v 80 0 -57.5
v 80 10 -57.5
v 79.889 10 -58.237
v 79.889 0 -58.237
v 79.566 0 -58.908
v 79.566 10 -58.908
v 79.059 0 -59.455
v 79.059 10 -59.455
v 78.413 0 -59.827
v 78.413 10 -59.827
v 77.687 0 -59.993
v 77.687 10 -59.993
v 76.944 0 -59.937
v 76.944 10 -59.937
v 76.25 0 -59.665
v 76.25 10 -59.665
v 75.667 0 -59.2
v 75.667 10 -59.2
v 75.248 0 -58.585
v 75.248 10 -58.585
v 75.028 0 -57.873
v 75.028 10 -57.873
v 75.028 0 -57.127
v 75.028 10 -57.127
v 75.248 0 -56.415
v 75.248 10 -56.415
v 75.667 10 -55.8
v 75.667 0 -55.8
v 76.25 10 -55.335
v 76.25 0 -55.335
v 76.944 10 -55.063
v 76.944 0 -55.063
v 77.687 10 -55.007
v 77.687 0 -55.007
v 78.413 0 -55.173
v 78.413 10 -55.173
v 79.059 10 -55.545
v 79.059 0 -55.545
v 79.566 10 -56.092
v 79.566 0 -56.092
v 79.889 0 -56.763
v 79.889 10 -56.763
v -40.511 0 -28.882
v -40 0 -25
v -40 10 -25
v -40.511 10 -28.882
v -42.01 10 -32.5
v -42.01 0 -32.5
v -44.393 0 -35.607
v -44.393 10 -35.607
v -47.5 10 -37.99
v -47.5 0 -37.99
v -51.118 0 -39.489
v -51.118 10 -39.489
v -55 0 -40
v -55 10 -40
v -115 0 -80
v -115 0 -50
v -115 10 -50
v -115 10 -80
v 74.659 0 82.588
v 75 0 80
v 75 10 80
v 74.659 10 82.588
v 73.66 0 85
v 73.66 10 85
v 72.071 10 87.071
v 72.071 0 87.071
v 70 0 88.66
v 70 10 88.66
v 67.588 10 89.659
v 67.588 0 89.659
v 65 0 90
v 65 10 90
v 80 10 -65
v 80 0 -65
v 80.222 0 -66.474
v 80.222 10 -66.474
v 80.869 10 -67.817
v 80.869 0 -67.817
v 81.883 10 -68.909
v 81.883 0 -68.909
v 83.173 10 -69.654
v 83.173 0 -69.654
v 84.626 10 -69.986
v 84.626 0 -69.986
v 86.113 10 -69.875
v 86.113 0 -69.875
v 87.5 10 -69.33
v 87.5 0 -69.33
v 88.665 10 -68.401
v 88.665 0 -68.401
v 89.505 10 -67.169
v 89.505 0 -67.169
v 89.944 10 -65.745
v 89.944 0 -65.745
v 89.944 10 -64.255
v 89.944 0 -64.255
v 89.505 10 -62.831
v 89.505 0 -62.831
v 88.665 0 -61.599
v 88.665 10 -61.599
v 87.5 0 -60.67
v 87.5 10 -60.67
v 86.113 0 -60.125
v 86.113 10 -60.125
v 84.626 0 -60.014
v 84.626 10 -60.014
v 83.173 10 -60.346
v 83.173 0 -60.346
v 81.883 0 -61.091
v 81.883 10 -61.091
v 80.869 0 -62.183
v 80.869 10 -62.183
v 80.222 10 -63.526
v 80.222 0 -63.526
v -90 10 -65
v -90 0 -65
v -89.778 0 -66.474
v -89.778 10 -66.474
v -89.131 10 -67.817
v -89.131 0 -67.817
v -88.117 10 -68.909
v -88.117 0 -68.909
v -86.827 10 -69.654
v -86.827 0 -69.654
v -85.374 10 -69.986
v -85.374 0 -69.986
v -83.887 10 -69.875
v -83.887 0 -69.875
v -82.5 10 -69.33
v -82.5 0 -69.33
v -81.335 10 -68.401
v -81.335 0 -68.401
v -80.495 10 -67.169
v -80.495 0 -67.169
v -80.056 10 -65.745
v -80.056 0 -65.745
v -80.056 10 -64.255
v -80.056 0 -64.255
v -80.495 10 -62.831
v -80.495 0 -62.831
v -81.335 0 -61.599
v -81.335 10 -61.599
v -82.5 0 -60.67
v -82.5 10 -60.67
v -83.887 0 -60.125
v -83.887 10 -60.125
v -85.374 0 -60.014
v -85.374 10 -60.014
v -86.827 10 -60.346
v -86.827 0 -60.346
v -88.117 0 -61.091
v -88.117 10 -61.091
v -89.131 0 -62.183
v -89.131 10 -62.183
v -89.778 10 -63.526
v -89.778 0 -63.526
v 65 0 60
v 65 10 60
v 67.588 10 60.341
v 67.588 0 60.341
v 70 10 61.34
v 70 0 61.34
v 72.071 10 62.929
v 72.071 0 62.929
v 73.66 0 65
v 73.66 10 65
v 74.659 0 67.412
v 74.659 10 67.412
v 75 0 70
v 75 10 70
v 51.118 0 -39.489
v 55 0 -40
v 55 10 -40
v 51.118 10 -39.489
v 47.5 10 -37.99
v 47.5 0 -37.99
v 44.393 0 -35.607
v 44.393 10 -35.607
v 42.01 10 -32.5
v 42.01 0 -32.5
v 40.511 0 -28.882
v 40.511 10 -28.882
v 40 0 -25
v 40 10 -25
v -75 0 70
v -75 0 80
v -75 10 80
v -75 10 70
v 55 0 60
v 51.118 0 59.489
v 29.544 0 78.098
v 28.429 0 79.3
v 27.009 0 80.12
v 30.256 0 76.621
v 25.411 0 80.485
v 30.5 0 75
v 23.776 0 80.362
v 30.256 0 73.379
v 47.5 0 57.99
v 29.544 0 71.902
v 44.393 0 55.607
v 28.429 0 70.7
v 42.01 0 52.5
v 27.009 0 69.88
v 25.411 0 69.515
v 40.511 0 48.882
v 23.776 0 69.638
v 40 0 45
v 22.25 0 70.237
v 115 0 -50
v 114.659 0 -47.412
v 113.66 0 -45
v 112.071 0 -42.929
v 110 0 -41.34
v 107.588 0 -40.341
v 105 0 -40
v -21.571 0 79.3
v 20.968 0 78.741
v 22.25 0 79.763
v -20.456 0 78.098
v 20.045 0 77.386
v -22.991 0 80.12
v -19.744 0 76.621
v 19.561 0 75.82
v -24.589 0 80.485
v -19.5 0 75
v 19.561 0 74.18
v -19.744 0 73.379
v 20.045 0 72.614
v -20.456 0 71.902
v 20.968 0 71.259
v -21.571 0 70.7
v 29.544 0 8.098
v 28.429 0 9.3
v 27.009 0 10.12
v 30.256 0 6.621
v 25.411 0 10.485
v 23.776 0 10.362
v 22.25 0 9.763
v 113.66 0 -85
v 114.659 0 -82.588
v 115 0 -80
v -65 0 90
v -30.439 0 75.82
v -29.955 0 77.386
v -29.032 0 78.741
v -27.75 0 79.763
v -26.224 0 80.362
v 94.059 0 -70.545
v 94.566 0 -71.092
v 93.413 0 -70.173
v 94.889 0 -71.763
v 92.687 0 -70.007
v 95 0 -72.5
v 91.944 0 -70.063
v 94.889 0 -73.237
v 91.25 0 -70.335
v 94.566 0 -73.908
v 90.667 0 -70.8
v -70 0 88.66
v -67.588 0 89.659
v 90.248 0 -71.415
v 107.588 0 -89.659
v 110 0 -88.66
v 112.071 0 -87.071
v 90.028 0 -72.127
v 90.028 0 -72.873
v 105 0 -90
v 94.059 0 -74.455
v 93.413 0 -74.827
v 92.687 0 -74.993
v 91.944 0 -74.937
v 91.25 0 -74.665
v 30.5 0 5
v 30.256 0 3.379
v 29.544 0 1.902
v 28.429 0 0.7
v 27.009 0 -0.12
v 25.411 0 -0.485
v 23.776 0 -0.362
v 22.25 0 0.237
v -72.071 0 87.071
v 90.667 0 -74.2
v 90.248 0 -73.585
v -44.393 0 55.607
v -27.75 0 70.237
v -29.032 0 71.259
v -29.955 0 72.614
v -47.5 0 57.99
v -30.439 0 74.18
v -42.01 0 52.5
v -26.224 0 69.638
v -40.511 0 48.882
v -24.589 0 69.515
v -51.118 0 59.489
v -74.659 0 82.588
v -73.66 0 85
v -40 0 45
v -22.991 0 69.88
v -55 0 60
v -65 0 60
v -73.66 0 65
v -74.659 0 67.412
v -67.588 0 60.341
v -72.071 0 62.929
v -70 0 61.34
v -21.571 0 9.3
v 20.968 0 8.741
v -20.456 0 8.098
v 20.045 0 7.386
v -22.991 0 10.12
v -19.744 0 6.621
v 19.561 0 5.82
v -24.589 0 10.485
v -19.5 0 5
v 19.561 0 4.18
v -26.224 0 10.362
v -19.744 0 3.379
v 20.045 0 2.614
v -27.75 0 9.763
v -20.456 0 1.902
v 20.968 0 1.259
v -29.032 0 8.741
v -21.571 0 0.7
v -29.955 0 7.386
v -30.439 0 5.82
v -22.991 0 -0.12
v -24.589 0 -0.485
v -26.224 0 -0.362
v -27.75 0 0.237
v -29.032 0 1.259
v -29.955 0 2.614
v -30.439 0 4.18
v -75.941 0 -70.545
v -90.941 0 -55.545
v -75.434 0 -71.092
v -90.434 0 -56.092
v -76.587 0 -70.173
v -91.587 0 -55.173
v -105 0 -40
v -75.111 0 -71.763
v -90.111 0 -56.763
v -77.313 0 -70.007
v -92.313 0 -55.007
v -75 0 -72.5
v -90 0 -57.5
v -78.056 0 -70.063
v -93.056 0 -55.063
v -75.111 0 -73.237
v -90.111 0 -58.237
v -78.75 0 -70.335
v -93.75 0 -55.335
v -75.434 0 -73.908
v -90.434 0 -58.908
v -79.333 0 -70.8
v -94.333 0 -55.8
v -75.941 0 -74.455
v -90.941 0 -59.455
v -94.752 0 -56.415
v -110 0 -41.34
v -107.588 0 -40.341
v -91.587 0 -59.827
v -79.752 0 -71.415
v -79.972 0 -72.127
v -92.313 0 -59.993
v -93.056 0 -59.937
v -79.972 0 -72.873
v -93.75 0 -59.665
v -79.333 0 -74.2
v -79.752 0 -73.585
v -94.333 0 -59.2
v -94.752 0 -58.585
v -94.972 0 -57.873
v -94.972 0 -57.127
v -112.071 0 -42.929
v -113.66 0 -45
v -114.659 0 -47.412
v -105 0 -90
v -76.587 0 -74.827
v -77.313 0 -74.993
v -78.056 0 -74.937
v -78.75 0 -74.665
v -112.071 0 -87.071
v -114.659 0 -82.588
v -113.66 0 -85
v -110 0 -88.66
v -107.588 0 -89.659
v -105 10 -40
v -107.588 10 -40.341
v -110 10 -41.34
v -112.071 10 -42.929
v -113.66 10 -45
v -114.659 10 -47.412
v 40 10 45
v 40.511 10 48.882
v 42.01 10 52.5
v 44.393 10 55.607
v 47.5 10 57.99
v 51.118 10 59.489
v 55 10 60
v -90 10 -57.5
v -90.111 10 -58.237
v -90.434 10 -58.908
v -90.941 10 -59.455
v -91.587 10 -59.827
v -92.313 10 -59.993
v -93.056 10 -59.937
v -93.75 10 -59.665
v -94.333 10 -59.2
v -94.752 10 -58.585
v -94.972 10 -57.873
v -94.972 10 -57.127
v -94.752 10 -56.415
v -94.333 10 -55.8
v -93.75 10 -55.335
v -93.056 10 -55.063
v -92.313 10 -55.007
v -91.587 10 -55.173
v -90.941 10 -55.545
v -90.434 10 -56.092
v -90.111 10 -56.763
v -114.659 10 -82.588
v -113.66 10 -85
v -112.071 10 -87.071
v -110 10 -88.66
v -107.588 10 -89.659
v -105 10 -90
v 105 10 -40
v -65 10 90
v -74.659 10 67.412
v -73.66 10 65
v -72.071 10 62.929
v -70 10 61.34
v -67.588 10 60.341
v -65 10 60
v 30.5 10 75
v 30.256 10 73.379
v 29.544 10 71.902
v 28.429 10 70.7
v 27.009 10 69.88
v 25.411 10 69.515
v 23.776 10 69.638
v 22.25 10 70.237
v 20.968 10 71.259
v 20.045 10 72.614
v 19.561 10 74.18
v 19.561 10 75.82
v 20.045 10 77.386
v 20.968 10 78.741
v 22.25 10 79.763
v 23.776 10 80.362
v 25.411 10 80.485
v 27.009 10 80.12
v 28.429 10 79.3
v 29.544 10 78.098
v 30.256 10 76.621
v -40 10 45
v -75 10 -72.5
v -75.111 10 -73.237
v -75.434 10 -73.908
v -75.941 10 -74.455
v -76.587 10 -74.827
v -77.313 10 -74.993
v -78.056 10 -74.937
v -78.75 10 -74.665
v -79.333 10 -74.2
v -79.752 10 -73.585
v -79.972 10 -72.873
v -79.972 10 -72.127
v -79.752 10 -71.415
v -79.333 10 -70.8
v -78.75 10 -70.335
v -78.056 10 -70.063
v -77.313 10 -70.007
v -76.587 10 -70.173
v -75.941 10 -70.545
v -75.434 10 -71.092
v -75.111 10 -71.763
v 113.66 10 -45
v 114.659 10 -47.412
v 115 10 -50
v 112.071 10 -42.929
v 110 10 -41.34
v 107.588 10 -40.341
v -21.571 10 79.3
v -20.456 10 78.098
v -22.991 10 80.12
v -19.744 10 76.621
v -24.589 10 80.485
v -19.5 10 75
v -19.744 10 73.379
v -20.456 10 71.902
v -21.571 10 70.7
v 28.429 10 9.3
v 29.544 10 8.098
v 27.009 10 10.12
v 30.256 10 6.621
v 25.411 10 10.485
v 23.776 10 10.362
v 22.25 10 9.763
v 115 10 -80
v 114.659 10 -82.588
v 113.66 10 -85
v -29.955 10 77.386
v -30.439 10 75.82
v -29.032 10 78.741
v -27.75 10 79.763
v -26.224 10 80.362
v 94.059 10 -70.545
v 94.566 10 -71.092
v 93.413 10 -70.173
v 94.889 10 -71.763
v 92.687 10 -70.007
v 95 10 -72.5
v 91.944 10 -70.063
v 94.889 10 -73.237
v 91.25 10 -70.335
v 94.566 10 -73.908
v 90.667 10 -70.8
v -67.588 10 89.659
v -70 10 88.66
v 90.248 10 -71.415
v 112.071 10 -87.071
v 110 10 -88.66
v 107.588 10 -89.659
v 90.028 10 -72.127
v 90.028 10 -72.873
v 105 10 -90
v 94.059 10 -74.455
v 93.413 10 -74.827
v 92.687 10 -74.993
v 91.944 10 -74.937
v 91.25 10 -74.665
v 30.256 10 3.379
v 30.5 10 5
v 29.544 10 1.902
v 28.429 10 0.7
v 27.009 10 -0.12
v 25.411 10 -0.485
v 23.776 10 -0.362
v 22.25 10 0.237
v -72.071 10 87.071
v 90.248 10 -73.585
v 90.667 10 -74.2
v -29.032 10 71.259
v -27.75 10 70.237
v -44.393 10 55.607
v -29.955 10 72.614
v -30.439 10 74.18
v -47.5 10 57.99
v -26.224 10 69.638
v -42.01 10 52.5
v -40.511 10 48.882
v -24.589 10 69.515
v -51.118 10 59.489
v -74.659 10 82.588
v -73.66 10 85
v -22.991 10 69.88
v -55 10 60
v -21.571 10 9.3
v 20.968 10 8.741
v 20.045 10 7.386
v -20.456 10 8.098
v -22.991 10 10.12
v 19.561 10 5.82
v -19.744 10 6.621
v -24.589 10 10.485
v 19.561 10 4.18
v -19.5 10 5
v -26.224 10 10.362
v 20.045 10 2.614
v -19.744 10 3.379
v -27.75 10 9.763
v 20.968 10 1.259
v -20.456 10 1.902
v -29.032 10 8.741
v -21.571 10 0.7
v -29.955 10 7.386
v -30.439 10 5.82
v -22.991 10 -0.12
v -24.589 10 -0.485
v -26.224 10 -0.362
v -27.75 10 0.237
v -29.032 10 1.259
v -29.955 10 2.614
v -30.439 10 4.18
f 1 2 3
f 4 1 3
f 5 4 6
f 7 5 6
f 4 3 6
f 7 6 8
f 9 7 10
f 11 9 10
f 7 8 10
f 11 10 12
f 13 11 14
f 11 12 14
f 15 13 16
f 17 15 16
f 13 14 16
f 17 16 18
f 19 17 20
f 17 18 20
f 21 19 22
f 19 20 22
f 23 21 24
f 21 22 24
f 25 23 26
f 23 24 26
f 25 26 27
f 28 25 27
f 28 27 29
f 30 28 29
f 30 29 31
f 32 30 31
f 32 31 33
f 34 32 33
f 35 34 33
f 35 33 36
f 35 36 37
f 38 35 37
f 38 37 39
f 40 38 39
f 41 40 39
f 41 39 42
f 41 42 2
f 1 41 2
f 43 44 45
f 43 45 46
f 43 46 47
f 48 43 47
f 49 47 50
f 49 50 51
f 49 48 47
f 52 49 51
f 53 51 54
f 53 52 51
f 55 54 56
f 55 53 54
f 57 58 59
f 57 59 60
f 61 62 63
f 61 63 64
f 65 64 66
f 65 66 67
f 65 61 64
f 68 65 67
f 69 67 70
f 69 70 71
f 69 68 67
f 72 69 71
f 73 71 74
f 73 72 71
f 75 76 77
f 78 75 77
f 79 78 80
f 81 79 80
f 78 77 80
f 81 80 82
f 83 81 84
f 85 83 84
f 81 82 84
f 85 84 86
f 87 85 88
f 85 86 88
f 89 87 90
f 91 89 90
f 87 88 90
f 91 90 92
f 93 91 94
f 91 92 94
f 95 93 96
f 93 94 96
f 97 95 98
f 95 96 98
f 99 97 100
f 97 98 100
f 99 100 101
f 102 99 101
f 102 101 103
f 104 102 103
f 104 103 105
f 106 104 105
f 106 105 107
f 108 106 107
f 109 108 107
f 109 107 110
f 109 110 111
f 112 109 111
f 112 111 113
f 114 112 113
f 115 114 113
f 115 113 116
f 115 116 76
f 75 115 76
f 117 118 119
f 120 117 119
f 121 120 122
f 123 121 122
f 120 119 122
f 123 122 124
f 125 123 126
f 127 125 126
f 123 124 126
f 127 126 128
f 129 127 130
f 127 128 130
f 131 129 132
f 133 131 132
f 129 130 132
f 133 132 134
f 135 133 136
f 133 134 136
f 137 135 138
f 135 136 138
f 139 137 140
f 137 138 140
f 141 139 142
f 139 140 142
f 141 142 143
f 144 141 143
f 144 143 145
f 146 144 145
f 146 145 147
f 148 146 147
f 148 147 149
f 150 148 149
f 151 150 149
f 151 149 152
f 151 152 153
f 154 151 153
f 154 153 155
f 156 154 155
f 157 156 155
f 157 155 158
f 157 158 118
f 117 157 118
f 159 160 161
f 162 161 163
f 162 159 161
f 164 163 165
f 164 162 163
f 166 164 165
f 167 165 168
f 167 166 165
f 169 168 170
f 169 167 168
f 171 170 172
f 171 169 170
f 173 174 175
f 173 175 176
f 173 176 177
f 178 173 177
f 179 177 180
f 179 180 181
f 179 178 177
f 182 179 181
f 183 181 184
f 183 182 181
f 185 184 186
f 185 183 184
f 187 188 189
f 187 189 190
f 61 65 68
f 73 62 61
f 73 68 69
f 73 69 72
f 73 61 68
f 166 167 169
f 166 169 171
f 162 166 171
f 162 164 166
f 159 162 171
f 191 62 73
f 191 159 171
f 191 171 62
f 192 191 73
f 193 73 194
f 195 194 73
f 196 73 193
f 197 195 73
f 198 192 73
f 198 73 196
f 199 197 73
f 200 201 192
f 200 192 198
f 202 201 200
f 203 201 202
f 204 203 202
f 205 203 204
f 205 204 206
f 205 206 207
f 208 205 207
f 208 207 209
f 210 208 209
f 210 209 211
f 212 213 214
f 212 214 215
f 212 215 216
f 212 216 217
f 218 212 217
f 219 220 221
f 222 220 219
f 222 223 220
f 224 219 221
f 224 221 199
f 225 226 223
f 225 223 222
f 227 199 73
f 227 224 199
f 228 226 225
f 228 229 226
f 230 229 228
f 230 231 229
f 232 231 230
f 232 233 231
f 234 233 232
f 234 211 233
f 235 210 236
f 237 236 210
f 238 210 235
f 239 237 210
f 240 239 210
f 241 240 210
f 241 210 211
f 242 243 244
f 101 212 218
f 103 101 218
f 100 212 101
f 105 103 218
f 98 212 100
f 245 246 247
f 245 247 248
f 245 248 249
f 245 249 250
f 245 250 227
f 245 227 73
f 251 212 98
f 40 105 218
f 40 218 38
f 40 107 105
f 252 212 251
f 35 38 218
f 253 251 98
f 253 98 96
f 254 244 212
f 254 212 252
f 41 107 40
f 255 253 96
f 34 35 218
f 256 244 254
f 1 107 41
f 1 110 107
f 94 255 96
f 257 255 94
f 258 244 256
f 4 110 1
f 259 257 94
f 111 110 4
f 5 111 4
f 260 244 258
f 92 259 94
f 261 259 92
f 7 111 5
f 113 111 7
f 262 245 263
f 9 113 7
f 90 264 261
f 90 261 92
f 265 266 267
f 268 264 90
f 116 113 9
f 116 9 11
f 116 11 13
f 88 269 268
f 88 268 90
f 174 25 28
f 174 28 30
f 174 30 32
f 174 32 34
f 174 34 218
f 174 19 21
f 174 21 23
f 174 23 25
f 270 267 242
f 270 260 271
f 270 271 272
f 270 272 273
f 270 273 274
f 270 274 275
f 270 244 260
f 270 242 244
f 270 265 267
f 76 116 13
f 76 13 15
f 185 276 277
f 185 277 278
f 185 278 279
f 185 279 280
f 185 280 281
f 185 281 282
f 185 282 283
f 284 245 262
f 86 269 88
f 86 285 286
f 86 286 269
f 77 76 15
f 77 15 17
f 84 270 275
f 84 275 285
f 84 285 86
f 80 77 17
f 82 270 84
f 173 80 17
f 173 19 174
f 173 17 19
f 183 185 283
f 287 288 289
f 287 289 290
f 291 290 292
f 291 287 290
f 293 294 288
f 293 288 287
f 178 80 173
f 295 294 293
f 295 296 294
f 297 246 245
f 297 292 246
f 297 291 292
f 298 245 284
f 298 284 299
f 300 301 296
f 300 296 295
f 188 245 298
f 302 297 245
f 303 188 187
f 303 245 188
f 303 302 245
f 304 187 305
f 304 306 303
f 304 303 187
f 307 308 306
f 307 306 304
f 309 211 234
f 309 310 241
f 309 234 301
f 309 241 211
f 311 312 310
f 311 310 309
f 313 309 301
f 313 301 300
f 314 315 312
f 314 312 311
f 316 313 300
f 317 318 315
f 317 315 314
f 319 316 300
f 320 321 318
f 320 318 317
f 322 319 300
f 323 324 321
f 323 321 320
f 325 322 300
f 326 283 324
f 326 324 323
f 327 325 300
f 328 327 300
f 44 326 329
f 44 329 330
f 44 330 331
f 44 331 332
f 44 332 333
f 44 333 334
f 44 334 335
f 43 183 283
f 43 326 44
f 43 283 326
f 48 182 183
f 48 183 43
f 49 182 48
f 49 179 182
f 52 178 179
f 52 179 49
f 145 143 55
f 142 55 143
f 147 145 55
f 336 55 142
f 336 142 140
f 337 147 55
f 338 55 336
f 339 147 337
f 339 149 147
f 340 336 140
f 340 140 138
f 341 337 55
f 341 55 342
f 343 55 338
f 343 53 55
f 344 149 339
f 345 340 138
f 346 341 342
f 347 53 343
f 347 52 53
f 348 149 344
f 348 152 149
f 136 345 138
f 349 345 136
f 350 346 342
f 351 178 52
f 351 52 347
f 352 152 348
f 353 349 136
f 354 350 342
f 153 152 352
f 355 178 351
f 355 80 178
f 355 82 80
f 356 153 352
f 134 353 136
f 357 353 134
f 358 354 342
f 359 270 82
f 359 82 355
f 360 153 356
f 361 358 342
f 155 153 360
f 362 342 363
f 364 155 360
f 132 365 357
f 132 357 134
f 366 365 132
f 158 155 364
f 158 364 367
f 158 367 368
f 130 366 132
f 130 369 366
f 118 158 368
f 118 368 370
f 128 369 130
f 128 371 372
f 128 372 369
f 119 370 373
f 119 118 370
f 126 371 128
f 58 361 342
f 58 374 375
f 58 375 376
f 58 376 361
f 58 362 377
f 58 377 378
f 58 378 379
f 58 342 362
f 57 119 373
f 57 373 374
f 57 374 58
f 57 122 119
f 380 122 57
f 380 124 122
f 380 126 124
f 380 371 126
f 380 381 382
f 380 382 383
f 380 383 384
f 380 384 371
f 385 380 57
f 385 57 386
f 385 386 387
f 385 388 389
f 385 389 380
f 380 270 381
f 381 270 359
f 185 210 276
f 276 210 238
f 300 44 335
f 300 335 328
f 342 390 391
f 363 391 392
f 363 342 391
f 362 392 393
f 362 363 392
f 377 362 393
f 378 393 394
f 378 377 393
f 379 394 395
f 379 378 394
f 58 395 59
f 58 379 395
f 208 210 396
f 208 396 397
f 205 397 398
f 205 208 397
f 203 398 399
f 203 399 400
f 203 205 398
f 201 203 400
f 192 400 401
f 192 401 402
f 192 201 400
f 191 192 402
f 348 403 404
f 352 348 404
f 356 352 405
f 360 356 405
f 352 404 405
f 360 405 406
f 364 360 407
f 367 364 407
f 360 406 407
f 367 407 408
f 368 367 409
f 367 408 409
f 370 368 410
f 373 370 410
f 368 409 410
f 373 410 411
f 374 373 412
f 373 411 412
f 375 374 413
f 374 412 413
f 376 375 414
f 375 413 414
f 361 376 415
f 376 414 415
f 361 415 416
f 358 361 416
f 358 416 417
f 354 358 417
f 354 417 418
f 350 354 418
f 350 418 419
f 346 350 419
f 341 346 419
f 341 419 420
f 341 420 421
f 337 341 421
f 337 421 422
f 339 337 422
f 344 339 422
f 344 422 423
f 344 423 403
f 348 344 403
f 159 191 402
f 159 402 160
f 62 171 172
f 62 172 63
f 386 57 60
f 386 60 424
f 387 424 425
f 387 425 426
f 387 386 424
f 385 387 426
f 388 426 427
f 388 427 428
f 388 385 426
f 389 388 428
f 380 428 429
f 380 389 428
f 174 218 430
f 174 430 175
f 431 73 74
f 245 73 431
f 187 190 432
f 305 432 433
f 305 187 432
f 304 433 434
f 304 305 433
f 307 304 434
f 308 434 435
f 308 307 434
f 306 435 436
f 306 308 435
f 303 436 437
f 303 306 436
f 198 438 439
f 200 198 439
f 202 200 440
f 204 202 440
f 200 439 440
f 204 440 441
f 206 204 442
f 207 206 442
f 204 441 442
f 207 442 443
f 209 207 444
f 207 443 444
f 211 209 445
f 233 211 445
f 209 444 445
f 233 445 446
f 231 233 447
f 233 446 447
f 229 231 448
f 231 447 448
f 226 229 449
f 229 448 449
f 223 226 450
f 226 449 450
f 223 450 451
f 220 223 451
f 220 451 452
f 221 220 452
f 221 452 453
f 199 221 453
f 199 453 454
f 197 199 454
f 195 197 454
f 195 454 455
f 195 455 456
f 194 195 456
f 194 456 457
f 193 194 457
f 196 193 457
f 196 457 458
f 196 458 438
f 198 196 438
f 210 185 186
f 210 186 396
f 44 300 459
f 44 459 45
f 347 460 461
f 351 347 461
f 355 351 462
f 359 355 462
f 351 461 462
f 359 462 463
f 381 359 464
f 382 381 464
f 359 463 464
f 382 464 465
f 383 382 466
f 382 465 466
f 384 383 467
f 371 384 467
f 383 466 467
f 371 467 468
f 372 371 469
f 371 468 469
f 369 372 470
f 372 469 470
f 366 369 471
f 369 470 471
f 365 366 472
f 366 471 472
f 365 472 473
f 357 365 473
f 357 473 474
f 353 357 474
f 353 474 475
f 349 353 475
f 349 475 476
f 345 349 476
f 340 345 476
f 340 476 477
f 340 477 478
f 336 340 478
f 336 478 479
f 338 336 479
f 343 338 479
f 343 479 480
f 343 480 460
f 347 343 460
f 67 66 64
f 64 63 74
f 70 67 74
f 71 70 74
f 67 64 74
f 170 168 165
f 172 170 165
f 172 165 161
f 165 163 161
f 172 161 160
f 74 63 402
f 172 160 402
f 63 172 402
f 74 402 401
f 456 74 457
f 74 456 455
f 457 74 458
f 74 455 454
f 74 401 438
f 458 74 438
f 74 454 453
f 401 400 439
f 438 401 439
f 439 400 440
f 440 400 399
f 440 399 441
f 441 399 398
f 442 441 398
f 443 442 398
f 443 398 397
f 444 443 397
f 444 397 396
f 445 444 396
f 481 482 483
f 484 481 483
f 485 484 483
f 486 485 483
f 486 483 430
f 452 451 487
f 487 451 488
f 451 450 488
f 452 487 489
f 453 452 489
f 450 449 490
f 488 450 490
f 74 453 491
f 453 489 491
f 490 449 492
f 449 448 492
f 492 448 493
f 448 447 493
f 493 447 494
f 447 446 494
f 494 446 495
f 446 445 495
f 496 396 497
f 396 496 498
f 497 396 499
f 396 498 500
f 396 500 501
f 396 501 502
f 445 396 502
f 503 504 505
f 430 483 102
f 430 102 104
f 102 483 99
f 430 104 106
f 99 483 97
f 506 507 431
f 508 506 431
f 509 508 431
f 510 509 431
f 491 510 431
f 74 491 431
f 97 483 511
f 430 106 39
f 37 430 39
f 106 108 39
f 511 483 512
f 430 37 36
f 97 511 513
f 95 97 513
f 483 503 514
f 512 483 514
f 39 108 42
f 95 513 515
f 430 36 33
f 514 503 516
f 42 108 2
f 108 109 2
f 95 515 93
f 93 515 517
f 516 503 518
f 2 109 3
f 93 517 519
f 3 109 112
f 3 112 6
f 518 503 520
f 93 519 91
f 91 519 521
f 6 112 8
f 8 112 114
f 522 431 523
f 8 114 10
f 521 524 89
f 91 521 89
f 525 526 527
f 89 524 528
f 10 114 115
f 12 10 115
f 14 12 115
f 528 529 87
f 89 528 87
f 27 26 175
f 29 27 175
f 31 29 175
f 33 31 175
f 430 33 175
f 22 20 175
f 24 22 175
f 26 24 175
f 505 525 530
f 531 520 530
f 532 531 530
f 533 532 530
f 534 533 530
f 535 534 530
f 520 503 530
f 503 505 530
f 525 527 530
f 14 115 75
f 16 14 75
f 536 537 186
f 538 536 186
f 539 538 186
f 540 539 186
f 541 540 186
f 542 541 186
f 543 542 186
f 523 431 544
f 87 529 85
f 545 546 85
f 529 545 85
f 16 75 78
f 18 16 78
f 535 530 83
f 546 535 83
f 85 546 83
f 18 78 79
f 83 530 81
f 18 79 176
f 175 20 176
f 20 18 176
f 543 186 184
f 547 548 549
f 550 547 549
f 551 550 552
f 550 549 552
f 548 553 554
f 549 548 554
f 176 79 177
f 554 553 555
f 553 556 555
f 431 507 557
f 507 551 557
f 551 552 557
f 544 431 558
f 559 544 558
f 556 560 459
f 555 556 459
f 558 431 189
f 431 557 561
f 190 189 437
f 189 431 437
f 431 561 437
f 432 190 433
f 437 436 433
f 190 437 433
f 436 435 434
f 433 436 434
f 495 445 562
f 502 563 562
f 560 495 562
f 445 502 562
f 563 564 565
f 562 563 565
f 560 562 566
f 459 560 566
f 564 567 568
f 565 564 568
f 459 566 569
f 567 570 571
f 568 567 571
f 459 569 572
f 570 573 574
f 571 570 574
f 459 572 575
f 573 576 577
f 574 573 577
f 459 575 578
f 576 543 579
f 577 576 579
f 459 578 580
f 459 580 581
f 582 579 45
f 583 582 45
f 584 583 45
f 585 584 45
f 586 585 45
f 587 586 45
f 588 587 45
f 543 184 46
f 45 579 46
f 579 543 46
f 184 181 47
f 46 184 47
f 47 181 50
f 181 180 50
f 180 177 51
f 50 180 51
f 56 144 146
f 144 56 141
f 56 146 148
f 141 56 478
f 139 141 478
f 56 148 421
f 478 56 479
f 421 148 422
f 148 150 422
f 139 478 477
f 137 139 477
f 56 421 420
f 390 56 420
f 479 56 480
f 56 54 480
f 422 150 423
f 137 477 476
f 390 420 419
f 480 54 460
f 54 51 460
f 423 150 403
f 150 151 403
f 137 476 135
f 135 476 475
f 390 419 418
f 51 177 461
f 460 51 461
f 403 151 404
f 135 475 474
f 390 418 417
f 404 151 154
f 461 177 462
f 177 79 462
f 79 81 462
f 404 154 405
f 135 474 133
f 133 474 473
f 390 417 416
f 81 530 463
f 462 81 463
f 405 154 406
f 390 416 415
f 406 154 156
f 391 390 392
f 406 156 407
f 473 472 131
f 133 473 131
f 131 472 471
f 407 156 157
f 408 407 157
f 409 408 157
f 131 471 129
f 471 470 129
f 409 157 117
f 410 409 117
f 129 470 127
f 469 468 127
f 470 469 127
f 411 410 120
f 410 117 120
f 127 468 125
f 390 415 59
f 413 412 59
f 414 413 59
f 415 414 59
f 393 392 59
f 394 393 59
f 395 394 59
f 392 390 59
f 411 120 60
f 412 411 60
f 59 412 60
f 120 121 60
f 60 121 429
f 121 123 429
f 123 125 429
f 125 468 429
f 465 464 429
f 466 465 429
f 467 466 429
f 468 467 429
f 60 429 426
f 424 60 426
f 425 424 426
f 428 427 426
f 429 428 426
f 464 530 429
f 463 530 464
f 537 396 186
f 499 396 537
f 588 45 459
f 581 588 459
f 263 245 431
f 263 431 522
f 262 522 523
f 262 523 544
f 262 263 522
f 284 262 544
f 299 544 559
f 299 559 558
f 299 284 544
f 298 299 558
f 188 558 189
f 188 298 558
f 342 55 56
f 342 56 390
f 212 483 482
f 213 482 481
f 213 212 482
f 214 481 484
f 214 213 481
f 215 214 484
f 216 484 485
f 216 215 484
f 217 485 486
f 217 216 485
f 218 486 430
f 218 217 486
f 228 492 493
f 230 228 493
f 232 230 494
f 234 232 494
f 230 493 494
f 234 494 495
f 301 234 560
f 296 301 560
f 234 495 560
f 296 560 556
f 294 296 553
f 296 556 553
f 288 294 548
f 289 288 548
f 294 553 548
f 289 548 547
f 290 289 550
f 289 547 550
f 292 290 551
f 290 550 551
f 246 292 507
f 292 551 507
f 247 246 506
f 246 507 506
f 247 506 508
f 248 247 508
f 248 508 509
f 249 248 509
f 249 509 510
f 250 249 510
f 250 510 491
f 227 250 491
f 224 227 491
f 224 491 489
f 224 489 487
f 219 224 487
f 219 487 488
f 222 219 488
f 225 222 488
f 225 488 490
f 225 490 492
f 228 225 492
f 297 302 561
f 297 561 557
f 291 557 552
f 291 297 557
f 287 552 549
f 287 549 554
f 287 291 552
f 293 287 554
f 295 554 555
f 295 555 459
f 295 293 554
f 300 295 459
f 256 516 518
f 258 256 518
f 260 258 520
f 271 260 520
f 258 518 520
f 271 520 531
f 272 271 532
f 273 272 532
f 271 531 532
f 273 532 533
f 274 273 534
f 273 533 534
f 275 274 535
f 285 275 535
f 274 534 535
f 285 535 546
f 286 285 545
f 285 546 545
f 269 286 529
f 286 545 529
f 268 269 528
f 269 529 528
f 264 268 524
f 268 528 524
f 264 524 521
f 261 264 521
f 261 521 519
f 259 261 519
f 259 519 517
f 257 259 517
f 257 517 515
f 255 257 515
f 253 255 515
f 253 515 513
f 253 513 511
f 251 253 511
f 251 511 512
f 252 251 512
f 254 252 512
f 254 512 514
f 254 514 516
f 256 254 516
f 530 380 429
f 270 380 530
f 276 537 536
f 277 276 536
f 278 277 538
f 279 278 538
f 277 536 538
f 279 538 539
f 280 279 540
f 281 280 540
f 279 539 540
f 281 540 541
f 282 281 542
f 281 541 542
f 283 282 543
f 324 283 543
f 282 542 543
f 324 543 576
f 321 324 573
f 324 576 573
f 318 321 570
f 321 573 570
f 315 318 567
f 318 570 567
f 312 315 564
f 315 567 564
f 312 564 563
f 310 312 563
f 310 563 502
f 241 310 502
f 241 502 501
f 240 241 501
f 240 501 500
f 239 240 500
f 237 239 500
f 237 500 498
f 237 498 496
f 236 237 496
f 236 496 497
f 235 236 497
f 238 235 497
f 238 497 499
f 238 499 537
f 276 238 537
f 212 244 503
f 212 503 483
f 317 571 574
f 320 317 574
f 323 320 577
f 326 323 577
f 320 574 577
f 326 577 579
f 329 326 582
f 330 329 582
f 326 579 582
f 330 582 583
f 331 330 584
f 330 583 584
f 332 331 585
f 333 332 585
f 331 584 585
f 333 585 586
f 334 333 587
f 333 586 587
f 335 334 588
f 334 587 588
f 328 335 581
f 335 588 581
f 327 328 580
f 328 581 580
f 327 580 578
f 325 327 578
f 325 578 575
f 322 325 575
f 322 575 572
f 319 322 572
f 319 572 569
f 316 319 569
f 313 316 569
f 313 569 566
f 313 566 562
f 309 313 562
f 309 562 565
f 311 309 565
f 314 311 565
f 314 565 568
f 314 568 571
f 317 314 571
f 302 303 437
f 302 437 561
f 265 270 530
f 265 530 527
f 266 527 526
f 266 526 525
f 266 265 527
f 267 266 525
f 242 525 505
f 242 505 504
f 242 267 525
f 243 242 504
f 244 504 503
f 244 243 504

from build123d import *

# Parameters (mm, degrees)
AUFSATZ_LINEAR_AUSTRAGEN1_DEPTH  = 10
F_10_0_10_DURCHMESSER_BOHRUNG1_D = 10
F_5_0_5_DURCHMESSER_BOHRUNG1_D   = 5
DURCHGANGSLOCH_F_R_M101_D        = 11


with BuildPart() as part:
    # Skizze1 → Aufsatz-Linear austragen1 (new body)
    with BuildSketch(Plane(origin=(0, 0, 0), x_dir=(1, 0, 0), z_dir=(0, 1, 0))):
        with BuildLine():
            Line((-105, 90), (105, 90))
            ThreePointArc((105, 90), (112.071067812, 87.071067812), (115, 80))
            Line((115, 80), (115, 50))
            ThreePointArc((115, 50), (112.071067812, 42.928932188), (105, 40))
            Line((105, 40), (55, 40))
            ThreePointArc((55, 40), (44.393398282, 35.606601718), (40, 25))
            Line((40, 25), (40, -45))
            ThreePointArc((40, -45), (44.393398282, -55.606601718), (55, -60))
            Line((55, -60), (65, -60))
            ThreePointArc((65, -60), (72.071067812, -62.928932188), (75, -70))
            Line((75, -70), (75, -80))
            ThreePointArc((75, -80), (72.071067812, -87.071067812), (65, -90))
            Line((65, -90), (-65, -90))
            ThreePointArc((-65, -90), (-72.071067812, -87.071067812), (-75, -80))
            Line((-75, -80), (-75, -70))
            ThreePointArc((-75, -70), (-72.071067812, -62.928932188), (-65, -60))
            Line((-65, -60), (-55, -60))
            ThreePointArc((-55, -60), (-44.393398282, -55.606601718), (-40, -45))
            Line((-40, -45), (-40, 25))
            ThreePointArc((-40, 25), (-44.393398282, 35.606601718), (-55, 40))
            Line((-55, 40), (-105, 40))
            ThreePointArc((-105, 40), (-112.071067812, 42.928932188), (-115, 50))
            Line((-115, 50), (-115, 80))
            ThreePointArc((-115, 80), (-112.071067812, 87.071067812), (-105, 90))
        make_face()
    extrude(amount=AUFSATZ_LINEAR_AUSTRAGEN1_DEPTH)

    # Ø10.0 (10) Durchmesser Bohrung1 (through all)
    with Locations(Plane(origin=(0, 10, 0), x_dir=(1, 0, 0), z_dir=(0, 1, 0))):
        with Locations((-85, 65), (85, 65)):
            Hole(F_10_0_10_DURCHMESSER_BOHRUNG1_D / 2)

    # Ø5.0 (5) Durchmesser Bohrung1 (through all)
    with Locations(Plane(origin=(0, 0, 0), x_dir=(-1, 0, 0), z_dir=(0, -1, 0))):
        with Locations((77.5, 72.5), (92.5, 57.5), (-92.5, 72.5), (-77.5, 57.5)):
            Hole(F_5_0_5_DURCHMESSER_BOHRUNG1_D / 2)

    # Durchgangsloch für M101 (through all)
    with Locations(Plane(origin=(0, 0, 0), x_dir=(-1, 0, 0), z_dir=(0, -1, 0))):
        with Locations((-25, -5), (-25, -75), (25, -5), (25, -75)):
            Hole(DURCHGANGSLOCH_F_R_M101_D / 2)


solid = part.part
